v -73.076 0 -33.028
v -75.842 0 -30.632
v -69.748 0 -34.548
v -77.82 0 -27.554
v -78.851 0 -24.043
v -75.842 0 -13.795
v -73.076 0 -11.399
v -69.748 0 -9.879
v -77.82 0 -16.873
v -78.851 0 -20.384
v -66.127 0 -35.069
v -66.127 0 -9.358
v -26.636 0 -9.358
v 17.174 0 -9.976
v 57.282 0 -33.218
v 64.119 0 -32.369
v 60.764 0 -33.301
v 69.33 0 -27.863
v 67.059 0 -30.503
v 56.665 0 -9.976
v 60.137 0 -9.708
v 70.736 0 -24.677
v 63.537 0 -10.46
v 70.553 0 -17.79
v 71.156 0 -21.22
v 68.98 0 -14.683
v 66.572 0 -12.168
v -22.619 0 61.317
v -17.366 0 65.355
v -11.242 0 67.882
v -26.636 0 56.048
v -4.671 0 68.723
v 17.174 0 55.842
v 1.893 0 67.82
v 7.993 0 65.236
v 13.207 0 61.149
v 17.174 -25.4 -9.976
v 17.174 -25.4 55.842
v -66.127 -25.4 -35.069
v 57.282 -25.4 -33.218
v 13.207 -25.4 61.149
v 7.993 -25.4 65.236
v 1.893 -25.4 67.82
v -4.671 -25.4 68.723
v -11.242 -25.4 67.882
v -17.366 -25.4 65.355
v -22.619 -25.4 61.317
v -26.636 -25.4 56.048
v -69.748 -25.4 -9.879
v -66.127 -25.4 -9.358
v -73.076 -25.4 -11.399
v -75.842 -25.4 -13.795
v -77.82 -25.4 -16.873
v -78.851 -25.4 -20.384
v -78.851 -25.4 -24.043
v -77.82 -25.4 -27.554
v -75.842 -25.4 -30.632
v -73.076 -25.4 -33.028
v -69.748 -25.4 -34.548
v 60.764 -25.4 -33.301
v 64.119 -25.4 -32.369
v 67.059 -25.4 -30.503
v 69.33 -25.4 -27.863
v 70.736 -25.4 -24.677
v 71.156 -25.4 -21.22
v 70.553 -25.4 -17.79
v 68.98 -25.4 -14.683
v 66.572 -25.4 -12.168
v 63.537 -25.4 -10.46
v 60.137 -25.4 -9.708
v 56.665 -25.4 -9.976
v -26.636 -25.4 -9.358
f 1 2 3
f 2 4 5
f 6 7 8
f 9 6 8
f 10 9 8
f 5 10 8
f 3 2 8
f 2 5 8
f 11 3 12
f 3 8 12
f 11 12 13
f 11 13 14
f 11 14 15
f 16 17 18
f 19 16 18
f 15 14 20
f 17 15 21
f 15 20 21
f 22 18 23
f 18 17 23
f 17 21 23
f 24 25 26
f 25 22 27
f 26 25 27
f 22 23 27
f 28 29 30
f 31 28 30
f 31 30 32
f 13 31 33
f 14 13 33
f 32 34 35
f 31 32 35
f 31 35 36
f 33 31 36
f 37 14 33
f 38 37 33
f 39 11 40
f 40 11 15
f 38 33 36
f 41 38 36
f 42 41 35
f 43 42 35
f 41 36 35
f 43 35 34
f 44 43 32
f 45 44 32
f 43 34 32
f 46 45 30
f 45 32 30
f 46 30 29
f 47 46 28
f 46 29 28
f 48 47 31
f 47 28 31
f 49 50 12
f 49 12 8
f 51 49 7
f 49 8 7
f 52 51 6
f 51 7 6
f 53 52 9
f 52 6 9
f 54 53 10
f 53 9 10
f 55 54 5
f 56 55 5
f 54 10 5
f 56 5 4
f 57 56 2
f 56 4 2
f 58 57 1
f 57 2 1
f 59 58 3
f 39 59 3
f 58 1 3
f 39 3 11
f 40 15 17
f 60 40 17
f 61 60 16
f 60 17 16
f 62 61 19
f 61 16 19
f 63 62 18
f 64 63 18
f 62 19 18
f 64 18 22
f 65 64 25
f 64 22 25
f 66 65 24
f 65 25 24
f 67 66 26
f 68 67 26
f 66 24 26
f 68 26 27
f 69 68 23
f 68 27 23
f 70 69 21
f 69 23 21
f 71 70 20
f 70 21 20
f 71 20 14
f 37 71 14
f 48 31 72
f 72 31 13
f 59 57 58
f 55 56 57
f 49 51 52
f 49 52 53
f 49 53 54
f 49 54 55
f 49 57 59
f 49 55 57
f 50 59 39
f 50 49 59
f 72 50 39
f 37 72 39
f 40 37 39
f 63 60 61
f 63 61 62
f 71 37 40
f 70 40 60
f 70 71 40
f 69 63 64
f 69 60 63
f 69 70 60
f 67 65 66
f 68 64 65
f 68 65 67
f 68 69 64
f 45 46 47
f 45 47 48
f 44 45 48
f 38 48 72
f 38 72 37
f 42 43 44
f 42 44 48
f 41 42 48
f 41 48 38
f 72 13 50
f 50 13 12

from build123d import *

# Parameters (mm, degrees)
F1_DEPTH = 25.4


with BuildPart() as f1:
    # F0 (on Front) → F1 (new body)
    with BuildSketch(Plane.XZ):
        with BuildLine():
            Line((-26.635719, 56.048136), (-26.635719, -9.358496))
            Line((-26.635719, -9.358496), (-59.750397, -9.358496))
            Line((-59.750397, -9.358496), (-66.126518, -9.358496))
            ThreePointArc((-66.126518, -9.358496), (-78.981595, -22.213573), (-66.126518, -35.06865))
            Line((-66.126518, -35.06865), (57.282224, -33.21752))
            ThreePointArc((57.282224, -33.21752), (71.156125, -21.220004), (56.665178, -9.97554))
            Line((56.665178, -9.97554), (17.174384, -9.97554))
            Line((17.174384, -9.97554), (17.174384, 55.842455))
            ThreePointArc((17.174384, 55.842455), (-4.670679, 68.722974), (-26.635719, 56.048136))
        make_face()
    extrude(amount=F1_DEPTH)


solid = f1.part
